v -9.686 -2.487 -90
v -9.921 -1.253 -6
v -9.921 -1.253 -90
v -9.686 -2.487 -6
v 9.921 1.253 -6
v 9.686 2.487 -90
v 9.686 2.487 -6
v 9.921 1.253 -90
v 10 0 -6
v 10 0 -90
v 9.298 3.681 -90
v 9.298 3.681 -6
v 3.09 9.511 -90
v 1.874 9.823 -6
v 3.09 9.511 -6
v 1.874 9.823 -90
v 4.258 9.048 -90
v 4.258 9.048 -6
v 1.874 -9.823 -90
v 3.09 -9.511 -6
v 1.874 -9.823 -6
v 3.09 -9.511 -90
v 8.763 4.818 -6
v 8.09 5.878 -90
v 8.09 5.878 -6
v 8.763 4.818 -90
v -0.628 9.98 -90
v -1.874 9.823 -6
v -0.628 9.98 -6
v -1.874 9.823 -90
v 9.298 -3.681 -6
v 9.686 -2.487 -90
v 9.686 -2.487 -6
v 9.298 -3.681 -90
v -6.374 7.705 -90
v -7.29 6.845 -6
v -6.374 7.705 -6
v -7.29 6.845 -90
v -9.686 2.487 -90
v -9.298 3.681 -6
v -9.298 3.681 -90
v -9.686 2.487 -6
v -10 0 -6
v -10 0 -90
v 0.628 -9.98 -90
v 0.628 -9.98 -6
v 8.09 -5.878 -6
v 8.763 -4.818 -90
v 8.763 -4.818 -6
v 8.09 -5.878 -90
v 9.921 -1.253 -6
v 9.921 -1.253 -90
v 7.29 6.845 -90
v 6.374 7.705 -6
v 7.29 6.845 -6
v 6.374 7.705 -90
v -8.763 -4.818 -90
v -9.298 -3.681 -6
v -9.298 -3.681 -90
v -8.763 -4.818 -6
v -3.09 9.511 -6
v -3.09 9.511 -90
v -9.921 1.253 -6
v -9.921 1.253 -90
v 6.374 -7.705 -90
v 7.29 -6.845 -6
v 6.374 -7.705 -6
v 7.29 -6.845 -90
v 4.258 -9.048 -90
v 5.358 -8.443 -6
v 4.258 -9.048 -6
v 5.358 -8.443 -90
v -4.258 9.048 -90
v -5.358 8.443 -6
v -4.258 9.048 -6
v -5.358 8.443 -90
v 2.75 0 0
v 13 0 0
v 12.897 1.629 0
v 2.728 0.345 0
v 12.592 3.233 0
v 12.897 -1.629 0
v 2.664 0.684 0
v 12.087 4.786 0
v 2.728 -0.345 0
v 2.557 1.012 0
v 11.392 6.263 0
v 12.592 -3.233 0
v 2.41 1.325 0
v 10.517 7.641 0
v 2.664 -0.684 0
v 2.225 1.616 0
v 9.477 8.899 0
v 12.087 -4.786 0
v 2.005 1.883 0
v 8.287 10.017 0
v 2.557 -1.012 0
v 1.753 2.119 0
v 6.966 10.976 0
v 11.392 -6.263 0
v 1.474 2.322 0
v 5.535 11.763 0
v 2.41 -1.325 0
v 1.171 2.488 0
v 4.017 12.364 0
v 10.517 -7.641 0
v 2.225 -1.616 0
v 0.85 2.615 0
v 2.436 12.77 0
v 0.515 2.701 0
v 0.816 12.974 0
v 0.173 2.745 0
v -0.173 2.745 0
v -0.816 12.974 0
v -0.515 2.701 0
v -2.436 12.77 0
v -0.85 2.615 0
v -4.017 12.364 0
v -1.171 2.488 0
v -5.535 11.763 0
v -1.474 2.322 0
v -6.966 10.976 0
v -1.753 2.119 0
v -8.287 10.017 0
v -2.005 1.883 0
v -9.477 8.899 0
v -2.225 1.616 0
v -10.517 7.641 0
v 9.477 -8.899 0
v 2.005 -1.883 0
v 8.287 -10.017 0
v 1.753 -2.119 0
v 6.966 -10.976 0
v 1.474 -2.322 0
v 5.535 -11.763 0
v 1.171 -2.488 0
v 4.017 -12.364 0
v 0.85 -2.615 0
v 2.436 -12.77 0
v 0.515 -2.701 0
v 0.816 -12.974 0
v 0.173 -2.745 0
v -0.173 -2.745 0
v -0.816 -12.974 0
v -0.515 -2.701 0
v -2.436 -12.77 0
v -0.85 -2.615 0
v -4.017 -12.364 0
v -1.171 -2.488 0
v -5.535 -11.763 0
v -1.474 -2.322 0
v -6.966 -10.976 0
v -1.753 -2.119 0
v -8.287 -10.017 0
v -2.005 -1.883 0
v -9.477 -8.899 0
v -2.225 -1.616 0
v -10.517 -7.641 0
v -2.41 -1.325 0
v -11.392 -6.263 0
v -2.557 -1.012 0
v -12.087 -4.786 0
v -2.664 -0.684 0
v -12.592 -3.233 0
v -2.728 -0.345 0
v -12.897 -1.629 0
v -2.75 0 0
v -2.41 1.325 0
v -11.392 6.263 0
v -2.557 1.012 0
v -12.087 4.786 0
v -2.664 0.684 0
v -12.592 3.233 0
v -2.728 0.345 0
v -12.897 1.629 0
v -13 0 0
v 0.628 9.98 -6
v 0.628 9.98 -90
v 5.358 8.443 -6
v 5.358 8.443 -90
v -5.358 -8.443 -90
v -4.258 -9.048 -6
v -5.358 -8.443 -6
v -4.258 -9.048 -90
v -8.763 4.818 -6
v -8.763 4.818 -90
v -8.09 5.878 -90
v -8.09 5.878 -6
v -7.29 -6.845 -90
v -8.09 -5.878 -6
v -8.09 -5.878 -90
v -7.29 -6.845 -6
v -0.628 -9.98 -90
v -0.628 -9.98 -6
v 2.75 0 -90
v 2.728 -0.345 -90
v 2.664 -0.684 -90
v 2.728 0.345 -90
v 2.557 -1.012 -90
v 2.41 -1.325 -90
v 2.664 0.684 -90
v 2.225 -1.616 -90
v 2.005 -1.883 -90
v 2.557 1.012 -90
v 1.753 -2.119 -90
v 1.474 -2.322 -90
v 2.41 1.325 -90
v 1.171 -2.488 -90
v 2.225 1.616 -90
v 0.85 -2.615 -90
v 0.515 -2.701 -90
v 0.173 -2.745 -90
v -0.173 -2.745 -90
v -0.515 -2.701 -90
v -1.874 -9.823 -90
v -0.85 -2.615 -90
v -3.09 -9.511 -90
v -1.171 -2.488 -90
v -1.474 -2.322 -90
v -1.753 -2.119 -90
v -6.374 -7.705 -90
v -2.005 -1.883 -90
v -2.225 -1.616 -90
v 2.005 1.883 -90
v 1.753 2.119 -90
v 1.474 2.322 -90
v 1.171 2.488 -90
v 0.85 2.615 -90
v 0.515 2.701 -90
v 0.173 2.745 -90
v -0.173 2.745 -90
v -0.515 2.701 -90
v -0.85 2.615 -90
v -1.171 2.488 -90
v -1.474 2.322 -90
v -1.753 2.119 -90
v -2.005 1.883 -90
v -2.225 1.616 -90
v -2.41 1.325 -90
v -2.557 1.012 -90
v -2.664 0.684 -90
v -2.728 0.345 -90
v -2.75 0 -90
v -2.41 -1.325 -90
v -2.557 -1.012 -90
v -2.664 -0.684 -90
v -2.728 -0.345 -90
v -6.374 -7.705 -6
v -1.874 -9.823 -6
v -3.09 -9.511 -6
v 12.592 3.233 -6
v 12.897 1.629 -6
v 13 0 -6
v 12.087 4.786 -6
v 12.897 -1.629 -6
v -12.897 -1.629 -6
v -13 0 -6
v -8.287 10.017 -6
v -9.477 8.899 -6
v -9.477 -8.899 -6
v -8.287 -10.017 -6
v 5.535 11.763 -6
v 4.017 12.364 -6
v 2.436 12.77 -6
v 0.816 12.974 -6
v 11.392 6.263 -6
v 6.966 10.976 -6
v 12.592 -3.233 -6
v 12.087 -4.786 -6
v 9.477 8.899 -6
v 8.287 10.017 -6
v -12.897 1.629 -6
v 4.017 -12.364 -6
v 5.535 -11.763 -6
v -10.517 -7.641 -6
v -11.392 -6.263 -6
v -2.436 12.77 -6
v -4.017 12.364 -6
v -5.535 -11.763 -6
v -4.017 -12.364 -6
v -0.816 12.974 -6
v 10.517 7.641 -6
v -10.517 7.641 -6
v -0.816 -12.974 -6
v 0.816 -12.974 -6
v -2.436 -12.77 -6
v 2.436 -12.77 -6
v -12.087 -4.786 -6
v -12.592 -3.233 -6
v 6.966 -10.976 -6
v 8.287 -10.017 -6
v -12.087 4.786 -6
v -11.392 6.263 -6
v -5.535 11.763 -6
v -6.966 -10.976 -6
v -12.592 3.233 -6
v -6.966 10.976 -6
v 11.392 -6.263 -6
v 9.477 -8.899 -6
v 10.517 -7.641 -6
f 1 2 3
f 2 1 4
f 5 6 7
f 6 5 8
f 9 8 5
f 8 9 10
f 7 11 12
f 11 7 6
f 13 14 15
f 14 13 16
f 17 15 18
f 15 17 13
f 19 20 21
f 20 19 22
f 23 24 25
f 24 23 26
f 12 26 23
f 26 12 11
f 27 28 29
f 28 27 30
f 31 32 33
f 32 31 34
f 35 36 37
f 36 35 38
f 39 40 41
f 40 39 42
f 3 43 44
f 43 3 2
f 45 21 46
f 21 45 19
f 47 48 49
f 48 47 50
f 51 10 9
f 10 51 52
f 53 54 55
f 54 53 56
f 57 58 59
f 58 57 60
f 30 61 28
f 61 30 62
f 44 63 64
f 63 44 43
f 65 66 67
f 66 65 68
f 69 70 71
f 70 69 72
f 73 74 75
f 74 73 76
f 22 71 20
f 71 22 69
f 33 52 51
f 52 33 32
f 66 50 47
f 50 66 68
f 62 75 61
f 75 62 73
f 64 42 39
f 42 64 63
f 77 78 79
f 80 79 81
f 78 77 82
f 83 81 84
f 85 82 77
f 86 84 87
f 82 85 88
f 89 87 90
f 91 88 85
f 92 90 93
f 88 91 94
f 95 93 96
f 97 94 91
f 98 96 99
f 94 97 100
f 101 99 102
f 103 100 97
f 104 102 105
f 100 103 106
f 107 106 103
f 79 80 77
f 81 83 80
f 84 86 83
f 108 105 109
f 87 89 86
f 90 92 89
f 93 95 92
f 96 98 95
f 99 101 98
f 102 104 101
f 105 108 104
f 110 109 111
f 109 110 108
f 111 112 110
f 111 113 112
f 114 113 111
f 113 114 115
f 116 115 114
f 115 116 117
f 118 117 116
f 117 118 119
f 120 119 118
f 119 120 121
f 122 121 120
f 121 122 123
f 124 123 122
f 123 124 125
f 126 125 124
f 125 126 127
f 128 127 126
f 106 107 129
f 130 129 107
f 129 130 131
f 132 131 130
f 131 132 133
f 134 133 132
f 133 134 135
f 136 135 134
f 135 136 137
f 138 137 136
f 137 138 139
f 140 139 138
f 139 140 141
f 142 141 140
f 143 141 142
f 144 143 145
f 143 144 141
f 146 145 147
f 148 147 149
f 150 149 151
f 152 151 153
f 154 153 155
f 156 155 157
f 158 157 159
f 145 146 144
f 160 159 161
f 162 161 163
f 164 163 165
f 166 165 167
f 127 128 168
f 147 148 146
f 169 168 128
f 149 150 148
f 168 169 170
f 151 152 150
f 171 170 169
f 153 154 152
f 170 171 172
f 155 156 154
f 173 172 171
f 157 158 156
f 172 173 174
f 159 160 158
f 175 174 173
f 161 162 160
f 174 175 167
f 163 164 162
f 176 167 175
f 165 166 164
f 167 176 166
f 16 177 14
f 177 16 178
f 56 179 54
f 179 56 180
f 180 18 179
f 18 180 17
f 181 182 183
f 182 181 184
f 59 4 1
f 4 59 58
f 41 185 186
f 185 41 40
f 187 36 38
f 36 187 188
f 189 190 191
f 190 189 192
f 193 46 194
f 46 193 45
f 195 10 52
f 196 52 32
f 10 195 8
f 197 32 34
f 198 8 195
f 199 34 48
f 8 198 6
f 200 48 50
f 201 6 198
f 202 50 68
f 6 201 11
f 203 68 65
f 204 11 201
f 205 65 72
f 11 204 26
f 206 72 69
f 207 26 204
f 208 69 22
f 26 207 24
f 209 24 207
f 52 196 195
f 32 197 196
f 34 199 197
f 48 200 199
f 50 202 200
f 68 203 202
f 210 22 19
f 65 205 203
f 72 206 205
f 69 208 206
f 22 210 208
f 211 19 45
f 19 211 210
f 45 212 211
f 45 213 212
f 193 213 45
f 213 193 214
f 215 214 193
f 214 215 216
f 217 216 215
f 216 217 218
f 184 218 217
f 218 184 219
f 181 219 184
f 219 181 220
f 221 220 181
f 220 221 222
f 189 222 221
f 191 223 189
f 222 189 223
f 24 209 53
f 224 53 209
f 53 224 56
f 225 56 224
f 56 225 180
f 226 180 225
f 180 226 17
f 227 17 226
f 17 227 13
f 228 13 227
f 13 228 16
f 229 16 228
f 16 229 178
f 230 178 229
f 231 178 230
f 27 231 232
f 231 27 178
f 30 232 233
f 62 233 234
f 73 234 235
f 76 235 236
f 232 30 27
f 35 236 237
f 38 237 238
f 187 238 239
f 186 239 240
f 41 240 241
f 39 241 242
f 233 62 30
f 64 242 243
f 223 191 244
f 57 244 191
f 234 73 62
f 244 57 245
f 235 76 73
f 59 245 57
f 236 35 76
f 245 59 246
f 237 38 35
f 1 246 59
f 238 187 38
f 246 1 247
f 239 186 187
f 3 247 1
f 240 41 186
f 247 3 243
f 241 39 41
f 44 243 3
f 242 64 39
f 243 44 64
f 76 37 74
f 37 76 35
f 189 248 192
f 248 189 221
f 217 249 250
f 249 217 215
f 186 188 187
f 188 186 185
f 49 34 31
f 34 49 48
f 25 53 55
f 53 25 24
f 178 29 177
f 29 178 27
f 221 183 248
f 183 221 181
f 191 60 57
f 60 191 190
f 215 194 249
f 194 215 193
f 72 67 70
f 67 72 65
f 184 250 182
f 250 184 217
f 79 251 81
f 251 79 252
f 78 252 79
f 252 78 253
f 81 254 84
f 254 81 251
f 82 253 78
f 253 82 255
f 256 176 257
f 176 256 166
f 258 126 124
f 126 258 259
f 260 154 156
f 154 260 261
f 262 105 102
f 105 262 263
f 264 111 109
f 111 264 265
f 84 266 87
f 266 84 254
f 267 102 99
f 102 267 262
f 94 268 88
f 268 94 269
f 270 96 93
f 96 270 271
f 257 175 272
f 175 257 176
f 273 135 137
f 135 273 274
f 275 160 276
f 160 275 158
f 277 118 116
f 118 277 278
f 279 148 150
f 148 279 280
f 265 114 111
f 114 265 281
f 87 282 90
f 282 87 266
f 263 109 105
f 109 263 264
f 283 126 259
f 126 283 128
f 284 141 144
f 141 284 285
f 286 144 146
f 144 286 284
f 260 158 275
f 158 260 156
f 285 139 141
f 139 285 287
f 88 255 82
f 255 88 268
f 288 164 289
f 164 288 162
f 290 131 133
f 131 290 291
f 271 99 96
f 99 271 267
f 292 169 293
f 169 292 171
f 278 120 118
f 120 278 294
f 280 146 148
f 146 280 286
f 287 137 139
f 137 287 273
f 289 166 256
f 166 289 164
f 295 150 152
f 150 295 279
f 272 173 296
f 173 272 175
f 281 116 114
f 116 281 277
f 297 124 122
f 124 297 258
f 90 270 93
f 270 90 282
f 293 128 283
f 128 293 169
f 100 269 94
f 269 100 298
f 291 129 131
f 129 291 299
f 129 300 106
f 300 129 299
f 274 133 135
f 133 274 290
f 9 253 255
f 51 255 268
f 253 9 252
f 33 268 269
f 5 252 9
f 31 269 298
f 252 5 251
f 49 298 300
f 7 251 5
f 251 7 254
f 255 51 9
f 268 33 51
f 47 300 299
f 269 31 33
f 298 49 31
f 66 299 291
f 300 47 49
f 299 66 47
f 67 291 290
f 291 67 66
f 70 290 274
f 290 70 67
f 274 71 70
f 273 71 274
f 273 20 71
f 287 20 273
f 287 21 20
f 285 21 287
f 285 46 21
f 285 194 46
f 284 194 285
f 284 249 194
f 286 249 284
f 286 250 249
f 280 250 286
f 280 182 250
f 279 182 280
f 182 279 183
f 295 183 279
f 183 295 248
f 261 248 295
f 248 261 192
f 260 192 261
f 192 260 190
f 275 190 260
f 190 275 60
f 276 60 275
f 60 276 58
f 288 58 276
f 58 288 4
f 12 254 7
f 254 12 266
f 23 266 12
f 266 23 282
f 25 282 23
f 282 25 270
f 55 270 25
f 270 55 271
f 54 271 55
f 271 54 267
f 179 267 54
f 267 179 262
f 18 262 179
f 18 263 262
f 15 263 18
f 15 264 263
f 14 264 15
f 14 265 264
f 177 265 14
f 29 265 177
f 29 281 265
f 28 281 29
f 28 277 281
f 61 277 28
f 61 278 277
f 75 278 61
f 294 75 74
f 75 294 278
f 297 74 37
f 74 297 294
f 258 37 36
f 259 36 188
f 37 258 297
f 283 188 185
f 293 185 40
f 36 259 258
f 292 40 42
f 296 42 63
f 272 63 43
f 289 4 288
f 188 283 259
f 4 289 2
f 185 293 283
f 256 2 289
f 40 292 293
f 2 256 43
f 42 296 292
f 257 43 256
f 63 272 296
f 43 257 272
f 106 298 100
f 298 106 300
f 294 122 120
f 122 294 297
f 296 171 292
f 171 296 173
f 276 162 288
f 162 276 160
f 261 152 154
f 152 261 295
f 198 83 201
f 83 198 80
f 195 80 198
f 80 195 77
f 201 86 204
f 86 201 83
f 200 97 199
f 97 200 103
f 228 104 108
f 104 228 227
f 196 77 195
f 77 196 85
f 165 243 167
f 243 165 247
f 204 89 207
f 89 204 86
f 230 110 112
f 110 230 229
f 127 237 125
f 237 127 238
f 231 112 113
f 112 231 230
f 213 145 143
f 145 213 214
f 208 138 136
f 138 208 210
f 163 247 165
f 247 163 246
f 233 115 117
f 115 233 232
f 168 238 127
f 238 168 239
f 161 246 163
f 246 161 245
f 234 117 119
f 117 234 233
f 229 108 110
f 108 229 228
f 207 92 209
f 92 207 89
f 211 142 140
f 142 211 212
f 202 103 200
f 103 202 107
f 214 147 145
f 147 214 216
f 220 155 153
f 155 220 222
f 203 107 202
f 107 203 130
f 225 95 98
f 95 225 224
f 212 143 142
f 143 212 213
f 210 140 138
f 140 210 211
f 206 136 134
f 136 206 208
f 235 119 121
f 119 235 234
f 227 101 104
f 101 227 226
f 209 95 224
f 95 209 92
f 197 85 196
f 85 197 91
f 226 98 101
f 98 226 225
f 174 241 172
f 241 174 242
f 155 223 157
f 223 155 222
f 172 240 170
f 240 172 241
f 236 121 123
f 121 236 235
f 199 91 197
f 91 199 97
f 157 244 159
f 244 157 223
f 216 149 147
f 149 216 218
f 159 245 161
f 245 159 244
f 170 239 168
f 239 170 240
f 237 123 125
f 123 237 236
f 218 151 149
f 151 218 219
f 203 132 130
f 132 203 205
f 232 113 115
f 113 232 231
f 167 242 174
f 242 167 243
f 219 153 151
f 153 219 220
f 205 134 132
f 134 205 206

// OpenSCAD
$fn = 50;


difference() {
	union() {
		translate(v = [0, 0, -90.0000000000]) {
			cylinder(h = 90, r = 10.0000000000);
		}
		translate(v = [0, 0, -6.0000000000]) {
			cylinder(h = 6, r = 13.0000000000);
		}
	}
	union() {
		#translate(v = [0, 0, -90]) {
			cylinder(h = 90, r = 2.7500000000);
		}
	}
}
